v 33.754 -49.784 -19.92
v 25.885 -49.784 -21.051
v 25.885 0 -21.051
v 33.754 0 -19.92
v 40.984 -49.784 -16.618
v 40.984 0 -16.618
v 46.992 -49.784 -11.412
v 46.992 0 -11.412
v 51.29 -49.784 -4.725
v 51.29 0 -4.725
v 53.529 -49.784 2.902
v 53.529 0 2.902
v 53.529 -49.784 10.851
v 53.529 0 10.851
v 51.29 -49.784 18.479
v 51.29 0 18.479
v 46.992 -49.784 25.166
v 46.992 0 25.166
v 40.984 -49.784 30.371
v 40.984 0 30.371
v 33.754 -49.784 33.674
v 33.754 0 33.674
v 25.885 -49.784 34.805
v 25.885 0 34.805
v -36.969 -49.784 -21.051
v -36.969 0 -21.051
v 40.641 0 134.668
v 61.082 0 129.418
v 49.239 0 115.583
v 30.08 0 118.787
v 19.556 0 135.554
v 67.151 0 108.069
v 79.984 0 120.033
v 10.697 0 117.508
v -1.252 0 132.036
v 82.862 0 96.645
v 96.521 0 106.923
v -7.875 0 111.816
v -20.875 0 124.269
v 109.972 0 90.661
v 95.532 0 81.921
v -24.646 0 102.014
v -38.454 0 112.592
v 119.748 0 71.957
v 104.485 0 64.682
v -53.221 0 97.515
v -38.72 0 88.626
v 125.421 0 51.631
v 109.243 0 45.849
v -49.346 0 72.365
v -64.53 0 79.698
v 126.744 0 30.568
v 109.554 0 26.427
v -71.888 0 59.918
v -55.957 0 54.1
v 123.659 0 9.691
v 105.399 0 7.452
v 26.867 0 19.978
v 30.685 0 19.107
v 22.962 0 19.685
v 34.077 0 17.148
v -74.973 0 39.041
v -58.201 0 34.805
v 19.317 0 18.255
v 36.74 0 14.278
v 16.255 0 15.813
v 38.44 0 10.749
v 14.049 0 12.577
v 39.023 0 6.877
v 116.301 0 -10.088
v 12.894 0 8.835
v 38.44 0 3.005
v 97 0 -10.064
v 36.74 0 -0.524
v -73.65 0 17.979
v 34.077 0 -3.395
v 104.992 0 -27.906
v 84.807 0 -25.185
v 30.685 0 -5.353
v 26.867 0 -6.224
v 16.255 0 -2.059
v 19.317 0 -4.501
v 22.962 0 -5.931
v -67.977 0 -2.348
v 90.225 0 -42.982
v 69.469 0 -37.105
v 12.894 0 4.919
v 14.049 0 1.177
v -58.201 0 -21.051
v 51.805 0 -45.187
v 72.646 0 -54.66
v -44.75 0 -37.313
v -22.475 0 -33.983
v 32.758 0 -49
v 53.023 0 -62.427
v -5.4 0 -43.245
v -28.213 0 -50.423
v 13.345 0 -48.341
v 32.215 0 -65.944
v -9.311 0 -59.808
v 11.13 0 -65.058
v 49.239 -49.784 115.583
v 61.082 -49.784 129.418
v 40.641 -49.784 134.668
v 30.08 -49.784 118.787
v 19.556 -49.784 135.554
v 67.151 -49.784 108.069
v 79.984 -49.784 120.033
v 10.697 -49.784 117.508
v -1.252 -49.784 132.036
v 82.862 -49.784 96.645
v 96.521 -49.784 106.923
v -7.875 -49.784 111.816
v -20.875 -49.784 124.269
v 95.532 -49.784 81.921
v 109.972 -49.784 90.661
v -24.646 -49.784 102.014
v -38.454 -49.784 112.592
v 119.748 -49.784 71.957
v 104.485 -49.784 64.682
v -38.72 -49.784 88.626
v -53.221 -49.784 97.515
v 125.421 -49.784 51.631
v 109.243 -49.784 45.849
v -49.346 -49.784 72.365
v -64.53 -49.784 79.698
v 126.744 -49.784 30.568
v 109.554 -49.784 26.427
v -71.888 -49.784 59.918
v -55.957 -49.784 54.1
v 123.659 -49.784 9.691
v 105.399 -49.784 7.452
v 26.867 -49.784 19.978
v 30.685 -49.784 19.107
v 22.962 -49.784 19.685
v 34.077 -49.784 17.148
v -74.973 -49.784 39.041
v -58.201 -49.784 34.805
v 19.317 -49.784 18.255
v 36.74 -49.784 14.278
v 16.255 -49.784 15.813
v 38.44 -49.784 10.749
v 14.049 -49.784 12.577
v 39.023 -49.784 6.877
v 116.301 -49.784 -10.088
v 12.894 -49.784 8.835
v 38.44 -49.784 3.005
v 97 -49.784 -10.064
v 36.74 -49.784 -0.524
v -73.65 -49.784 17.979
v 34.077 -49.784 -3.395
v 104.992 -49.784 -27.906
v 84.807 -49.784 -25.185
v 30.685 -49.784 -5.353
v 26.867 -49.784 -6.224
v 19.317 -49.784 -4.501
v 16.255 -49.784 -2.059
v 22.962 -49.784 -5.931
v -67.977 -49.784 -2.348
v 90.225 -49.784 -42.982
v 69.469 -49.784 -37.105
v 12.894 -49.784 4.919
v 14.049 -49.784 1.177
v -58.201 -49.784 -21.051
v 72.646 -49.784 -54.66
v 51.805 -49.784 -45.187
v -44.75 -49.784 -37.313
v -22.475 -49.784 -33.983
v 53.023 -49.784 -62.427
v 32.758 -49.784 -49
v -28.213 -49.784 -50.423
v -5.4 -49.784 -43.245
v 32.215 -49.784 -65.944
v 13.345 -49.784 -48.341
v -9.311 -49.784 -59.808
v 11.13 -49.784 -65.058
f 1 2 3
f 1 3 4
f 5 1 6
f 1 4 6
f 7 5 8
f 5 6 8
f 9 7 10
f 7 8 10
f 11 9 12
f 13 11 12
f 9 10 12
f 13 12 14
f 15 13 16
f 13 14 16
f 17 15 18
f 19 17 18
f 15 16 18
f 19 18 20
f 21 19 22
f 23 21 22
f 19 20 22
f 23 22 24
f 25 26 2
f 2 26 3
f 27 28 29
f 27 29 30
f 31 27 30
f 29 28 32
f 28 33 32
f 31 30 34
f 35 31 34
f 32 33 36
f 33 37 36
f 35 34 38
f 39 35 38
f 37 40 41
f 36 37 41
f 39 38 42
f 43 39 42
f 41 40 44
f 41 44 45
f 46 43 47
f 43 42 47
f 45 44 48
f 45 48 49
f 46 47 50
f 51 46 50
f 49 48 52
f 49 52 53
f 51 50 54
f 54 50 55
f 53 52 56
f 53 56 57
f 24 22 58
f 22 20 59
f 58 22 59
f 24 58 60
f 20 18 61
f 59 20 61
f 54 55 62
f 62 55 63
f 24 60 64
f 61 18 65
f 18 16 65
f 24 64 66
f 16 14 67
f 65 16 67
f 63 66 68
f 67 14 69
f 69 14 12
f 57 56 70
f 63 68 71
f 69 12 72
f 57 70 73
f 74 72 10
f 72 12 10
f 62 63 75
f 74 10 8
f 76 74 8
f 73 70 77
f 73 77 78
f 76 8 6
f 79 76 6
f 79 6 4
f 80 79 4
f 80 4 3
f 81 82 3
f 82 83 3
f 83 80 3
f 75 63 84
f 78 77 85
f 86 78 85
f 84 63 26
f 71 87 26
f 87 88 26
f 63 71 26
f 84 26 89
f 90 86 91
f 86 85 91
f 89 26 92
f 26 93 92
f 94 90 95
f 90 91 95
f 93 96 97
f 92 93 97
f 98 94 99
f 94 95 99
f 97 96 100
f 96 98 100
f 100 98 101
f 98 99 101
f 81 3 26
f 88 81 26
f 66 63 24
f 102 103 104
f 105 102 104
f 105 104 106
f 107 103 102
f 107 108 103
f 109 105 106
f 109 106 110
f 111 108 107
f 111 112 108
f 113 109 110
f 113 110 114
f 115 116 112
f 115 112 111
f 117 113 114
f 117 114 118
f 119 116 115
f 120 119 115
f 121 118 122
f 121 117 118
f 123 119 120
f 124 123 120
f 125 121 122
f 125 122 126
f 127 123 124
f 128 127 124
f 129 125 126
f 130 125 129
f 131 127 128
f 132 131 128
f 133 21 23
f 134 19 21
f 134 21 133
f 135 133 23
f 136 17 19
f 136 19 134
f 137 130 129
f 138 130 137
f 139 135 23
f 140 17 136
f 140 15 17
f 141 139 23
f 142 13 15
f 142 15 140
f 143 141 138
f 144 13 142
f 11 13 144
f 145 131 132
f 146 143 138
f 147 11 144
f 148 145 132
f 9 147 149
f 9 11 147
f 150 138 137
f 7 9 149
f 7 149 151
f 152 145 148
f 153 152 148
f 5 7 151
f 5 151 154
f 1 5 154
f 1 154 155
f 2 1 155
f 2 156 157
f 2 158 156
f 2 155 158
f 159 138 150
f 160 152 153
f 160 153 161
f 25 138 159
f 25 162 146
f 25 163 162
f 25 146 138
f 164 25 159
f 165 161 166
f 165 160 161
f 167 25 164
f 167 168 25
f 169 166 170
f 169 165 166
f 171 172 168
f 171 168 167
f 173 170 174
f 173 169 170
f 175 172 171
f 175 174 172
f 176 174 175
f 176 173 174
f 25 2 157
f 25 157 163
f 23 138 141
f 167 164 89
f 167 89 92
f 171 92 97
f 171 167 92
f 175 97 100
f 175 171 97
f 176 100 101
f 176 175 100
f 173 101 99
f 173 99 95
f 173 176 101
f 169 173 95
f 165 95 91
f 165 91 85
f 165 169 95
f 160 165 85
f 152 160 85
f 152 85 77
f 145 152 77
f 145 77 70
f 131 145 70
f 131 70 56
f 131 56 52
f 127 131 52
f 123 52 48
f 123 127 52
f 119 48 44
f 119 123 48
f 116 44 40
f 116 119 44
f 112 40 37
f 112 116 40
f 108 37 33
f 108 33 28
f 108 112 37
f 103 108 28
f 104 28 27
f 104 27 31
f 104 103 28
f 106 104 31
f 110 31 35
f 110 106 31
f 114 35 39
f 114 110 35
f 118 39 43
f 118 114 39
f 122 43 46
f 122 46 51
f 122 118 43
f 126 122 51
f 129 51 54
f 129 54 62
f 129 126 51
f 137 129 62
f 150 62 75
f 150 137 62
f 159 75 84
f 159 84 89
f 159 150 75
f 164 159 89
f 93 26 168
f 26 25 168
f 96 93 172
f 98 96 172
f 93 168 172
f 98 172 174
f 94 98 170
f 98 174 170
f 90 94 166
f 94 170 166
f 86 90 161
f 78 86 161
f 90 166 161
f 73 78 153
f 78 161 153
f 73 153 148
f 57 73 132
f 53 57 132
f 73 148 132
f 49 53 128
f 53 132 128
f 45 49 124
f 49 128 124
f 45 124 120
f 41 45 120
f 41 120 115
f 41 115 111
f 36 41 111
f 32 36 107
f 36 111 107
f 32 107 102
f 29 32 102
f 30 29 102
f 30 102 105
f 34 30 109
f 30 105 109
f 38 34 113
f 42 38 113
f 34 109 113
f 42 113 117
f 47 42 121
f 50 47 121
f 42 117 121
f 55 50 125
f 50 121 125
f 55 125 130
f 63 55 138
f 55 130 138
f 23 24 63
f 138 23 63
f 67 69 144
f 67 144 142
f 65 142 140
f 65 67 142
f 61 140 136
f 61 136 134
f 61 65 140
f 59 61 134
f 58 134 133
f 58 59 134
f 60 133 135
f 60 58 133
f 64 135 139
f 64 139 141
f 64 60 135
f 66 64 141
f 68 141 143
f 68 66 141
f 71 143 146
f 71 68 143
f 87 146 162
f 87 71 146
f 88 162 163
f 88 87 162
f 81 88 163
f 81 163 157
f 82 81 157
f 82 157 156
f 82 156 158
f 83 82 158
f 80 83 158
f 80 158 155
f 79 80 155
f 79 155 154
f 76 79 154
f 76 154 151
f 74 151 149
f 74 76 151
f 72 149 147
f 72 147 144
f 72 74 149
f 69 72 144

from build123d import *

# Parameters (mm, degrees)
F0_R      = 13.137742
F1_DEPTH  = 49.784
F1_FACE_W = 49.784
F1_FACE_H = 55.855792


with BuildPart() as f1:
    # F0 (on Front) → F1 (new body)
    with BuildSketch(Plane.XZ):
        with BuildLine():
            Line((25.885448, 34.804828), (-58.201034, 34.804828))
            Line((-58.201034, 34.804828), (-58.201034, -21.050964))
            Line((-58.201034, -21.050964), (25.885448, -21.050964))
            ThreePointArc((25.885448, -21.050964), (53.813344, 6.876932), (25.885448, 34.804828))
        make_face()
        with Locations((25.885448, 6.876932)):
            Circle(F0_R, mode=Mode.SUBTRACT)
    extrude(amount=F1_DEPTH)

    # F1_face (on face) → F2 (revolve)
    with BuildSketch(Plane(origin=(-58.201034, -24.892, 6.876932), x_dir=(0, -1, 0), z_dir=(-1, 0, 0))):
        Rectangle(F1_FACE_W, F1_FACE_H)
    revolve(axis=Axis((25.885448, -24.892, 34.804828), (0, -1, 0)))


solid = f1.part
